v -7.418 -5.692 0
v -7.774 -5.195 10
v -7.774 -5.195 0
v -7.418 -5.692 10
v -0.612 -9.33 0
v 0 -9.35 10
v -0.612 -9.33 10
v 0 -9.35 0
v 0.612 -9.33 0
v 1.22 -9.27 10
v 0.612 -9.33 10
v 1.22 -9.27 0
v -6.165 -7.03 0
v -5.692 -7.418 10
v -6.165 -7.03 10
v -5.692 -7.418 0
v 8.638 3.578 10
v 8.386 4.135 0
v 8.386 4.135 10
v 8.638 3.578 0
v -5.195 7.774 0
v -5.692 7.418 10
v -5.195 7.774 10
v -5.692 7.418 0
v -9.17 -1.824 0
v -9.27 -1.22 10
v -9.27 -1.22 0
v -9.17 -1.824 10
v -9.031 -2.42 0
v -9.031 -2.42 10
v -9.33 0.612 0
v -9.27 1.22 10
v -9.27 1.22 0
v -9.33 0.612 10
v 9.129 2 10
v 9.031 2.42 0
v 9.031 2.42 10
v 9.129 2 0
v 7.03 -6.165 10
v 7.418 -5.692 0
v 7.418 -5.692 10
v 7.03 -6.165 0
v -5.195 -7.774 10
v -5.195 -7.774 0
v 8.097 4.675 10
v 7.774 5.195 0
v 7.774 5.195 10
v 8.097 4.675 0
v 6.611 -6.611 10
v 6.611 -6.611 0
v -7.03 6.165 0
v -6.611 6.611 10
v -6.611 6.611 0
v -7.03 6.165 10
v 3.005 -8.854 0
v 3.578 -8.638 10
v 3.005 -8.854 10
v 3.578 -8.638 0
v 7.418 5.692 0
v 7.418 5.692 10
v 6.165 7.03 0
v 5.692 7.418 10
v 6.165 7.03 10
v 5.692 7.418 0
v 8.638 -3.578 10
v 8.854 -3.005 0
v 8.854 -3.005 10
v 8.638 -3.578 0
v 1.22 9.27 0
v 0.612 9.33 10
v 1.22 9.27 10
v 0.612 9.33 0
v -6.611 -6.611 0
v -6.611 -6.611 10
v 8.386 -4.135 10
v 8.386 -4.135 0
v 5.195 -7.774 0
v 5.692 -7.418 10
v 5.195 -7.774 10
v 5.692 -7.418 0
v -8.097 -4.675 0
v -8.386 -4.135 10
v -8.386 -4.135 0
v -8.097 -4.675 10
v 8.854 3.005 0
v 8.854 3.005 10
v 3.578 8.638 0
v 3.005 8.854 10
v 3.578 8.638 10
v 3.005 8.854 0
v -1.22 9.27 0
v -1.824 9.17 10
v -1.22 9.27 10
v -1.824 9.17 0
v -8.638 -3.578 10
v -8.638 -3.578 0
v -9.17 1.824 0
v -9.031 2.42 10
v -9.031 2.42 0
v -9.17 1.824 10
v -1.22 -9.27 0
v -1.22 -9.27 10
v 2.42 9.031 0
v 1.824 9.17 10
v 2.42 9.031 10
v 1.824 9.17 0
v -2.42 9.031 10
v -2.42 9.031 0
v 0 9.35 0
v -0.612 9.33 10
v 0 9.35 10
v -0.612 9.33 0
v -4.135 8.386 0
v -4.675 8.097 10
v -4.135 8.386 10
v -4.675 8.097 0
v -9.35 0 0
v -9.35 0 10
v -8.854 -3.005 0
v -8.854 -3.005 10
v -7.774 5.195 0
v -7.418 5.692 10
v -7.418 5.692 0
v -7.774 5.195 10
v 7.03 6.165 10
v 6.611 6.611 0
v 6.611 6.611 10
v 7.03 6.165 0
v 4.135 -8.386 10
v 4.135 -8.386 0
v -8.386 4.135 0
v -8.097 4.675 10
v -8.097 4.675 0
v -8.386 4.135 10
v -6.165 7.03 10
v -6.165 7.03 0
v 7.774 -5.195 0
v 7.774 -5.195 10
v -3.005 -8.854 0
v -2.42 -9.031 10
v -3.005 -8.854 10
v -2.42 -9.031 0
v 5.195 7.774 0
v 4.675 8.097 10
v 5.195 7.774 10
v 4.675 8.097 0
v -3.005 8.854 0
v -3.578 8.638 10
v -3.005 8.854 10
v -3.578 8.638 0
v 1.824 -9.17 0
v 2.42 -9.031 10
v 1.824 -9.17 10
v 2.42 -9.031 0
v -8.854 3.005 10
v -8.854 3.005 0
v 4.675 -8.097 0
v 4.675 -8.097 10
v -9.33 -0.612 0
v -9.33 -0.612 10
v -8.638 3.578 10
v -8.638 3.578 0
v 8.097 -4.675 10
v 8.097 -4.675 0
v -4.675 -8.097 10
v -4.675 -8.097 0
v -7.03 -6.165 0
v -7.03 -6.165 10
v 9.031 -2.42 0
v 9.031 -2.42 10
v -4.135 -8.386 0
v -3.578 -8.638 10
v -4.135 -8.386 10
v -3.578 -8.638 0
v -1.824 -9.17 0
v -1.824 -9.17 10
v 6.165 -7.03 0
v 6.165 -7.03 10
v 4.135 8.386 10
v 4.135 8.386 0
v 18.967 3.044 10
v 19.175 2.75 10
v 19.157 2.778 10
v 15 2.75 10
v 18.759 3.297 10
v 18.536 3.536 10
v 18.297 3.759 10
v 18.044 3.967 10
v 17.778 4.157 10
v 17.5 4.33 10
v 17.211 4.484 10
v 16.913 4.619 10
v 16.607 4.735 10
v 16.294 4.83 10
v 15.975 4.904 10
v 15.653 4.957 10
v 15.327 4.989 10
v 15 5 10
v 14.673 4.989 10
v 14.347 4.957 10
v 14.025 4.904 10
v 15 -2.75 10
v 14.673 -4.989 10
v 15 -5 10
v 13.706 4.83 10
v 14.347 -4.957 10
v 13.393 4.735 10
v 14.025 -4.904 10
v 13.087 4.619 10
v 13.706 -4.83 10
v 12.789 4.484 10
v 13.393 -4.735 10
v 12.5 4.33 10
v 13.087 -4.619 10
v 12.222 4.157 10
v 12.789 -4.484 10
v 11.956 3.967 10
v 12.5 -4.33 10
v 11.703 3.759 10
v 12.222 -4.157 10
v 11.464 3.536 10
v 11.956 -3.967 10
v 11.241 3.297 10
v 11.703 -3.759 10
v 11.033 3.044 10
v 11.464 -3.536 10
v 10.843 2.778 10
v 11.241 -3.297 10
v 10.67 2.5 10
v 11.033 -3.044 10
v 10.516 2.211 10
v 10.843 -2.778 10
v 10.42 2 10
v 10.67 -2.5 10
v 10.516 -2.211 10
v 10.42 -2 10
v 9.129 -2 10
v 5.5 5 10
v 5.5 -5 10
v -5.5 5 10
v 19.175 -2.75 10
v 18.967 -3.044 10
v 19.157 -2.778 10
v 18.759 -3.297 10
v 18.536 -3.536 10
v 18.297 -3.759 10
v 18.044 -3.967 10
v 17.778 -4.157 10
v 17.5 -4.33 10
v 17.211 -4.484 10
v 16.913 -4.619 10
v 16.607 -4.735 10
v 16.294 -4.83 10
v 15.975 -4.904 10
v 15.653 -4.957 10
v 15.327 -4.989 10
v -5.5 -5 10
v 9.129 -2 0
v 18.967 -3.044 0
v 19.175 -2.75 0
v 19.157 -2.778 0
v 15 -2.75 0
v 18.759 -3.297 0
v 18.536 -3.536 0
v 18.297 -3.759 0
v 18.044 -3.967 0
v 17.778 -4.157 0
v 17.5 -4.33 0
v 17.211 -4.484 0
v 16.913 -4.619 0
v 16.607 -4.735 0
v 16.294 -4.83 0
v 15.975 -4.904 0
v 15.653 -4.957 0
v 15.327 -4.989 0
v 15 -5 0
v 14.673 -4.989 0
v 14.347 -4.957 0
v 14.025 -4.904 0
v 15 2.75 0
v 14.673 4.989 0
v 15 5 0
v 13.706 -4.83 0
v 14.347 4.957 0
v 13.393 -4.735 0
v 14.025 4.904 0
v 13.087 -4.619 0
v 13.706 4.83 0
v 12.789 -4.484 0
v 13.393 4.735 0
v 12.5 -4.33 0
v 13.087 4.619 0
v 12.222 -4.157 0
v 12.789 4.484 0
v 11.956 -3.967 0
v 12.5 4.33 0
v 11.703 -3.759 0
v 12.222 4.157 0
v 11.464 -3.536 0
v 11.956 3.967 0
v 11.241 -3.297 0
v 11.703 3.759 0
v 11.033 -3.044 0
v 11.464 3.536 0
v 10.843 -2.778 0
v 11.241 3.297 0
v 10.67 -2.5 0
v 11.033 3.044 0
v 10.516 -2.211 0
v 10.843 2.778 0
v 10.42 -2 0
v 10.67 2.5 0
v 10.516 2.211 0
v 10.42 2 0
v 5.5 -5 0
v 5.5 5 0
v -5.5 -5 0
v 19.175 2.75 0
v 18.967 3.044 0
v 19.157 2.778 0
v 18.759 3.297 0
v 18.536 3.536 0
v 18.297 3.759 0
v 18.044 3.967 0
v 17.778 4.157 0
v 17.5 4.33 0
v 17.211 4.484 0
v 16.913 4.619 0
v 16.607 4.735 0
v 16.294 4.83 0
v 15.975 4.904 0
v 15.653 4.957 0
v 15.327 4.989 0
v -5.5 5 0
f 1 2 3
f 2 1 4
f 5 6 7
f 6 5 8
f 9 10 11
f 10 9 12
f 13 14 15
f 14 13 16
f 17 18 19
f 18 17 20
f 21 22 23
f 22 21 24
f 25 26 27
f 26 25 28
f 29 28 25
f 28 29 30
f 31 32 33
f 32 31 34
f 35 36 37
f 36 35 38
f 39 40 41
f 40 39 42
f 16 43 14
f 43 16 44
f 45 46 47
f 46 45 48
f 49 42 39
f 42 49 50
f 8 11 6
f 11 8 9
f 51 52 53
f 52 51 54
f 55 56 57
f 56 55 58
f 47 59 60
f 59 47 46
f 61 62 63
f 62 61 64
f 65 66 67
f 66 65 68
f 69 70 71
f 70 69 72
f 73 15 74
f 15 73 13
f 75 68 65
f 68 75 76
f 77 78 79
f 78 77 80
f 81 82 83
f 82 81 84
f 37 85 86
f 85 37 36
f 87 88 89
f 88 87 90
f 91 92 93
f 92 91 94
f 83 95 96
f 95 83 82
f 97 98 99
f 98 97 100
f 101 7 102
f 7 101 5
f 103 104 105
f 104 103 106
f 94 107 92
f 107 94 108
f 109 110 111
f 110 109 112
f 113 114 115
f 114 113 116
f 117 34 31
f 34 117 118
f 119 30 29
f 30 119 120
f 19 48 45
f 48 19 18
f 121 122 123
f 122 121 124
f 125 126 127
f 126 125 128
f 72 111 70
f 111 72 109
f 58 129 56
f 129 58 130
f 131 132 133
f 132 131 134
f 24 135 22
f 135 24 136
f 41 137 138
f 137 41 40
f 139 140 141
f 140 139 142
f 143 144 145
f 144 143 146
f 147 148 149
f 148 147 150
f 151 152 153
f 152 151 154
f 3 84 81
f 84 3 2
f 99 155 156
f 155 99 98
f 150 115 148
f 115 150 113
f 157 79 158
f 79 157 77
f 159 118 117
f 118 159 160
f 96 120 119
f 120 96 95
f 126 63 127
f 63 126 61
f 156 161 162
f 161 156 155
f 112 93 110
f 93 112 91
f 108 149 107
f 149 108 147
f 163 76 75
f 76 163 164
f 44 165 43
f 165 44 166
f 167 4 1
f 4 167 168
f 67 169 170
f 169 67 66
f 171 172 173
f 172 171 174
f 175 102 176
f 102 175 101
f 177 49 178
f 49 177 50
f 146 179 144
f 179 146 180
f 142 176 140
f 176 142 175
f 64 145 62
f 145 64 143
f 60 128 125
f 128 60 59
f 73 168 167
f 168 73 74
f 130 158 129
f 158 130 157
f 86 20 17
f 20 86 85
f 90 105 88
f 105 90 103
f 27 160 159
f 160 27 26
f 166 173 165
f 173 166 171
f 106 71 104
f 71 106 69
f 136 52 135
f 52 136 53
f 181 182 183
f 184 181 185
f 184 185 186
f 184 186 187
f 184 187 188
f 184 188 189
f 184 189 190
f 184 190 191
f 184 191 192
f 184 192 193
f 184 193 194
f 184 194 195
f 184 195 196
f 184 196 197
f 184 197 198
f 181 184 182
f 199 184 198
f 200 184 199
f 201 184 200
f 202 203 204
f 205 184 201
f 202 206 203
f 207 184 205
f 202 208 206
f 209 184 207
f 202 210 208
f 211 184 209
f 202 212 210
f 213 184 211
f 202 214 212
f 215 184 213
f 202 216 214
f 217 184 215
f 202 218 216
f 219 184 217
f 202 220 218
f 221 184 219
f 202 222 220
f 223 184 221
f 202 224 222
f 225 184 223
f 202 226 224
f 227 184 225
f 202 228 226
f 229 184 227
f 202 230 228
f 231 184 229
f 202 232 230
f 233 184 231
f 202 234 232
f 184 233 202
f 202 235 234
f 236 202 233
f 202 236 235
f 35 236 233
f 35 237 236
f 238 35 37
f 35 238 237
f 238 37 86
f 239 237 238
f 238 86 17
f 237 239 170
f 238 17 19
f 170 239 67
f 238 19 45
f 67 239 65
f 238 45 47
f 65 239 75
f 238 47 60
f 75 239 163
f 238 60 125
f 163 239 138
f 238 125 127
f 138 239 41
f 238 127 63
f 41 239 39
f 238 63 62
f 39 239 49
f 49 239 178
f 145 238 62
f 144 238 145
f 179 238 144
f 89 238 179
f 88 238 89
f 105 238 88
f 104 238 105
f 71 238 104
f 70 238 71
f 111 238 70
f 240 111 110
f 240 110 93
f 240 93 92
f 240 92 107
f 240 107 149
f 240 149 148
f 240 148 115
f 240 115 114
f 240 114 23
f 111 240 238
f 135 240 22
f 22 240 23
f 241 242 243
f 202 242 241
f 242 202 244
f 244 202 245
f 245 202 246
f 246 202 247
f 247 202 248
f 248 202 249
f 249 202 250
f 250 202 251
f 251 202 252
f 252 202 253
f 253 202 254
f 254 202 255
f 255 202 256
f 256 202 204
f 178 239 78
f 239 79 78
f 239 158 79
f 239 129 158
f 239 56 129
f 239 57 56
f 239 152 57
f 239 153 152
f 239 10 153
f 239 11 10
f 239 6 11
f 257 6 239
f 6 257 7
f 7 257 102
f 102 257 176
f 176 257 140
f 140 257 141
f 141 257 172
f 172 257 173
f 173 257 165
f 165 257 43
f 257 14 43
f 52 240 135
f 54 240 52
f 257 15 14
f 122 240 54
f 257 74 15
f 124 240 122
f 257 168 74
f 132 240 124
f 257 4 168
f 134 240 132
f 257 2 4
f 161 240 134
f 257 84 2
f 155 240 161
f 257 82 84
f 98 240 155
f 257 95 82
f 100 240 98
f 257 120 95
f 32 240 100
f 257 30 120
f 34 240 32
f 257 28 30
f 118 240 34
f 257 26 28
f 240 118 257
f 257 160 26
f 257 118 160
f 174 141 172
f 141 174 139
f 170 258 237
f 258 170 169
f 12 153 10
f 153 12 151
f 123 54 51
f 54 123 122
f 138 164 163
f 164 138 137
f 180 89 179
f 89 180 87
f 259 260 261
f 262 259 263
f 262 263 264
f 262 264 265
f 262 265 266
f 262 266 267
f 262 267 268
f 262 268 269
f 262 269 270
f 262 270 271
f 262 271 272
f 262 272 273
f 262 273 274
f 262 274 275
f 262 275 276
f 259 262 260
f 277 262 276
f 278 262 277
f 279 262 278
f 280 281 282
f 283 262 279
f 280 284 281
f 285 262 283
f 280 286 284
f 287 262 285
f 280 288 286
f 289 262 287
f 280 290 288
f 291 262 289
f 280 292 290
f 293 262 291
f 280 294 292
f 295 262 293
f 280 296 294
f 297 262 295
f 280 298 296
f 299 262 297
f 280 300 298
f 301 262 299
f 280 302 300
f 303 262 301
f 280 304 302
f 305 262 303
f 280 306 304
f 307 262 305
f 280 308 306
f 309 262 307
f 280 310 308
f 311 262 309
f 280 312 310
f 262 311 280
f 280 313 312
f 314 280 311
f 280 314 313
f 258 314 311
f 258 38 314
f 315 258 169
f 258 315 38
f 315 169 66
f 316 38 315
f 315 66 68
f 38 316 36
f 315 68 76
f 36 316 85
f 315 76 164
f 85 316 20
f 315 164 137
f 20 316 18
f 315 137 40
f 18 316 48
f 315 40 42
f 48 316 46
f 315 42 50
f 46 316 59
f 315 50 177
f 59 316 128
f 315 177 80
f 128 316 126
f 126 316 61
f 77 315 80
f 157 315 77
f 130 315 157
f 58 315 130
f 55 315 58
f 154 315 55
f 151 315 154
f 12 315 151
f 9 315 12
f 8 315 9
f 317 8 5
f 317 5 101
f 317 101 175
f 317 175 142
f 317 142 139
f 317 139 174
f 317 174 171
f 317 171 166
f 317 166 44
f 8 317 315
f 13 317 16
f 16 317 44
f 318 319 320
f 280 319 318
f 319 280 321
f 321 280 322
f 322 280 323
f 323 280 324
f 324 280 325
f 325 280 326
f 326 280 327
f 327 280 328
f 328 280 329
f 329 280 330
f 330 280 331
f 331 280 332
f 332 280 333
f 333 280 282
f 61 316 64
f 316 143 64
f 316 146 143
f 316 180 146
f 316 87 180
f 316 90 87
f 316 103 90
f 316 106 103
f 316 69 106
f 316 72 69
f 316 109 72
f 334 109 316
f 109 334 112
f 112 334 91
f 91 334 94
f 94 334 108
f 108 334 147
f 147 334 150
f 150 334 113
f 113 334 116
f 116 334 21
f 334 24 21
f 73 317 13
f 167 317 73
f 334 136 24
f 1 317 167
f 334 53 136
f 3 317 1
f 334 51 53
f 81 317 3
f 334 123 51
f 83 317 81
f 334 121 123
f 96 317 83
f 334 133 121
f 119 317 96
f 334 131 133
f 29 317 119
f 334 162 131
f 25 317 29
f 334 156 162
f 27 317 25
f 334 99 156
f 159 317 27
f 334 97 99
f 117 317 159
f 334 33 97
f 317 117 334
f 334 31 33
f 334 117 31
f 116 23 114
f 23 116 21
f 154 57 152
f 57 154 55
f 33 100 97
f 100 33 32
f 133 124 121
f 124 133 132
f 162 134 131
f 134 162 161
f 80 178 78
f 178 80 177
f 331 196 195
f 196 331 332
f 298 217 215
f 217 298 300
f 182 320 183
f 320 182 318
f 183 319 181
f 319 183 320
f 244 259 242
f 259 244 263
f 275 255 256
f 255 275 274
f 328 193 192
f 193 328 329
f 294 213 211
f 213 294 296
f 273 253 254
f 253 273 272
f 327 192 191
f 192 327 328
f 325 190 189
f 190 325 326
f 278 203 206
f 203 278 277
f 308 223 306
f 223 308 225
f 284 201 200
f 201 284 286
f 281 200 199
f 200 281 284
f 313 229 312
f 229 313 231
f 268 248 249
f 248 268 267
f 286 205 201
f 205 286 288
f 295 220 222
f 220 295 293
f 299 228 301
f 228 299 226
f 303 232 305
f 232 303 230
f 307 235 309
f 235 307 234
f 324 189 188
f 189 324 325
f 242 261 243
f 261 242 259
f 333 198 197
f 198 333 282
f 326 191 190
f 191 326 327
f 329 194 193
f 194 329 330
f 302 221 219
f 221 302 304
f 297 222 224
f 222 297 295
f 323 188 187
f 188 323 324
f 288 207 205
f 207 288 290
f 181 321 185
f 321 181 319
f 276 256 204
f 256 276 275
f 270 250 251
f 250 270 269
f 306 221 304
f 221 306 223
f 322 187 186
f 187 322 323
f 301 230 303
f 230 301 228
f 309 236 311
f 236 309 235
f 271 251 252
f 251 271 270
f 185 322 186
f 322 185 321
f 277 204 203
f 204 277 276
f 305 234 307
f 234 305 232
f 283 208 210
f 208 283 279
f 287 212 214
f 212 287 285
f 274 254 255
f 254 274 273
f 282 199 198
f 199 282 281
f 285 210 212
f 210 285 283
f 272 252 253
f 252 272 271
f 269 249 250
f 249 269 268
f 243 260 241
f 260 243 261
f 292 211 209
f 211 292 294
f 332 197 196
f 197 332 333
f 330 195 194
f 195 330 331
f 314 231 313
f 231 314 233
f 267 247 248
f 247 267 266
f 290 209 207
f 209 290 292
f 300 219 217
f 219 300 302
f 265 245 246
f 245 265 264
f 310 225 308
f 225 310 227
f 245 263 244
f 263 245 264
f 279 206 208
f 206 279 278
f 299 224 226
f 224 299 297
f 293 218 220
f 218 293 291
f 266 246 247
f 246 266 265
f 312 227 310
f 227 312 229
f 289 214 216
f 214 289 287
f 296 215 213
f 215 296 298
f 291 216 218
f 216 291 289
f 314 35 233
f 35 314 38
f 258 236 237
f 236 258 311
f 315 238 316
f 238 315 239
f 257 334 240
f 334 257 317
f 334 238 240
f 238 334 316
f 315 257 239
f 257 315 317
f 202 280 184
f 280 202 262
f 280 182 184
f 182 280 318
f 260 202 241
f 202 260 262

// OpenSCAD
// Stand rod and tubing clip - prints flat as a 2-D profile in the XY plane
// Units: mm. $fn = 96 for the ring circles.

// ---------------- Parameters ----------------
ring_d        = 12.7;   // stand rod ring inner diameter
ring_wall     = 3;      // stand rod ring wall thickness
ring_outer    = ring_d + 2 * ring_wall; // 18.7 mm outer diameter
ring_open_w   = 10;     // width of the -X side opening (y = -5 to 5)

tub_d         = 6;      // tubing ring inner diameter
tub_wall      = 2;      // tubing ring wall thickness
tub_outer     = tub_d + 2 * tub_wall;   // 10 mm outer diameter
tub_open_w    = 4.5;    // width of the +X side opening (y = -2.25 to 2.25)

bridge_x0     = 8;      // bridge start (X)
bridge_x1     = 12;     // bridge end (X)
bridge_w      = bridge_x1 - bridge_x0;  // 6 mm wide (Y)

eps           = 0.5;    // cutter overshoot past faces
height        = 10;     // extrusion height (Z)

// ---------------- Model ----------------
difference() {
    union() {
        // Stand rod ring, centred at origin
        cylinder(d = ring_outer, h = height, $fn = 96);

        // Tubing ring, centred at x = 15, y = 0
        translate([15, 0, 0])
            cylinder(d = tub_outer, h = height, $fn = 96);

        // Solid bridge joining the two rings
        translate([bridge_x0, -bridge_w / 2, 0])
            cube([bridge_w, bridge_w, height]);
    }

    // Opening in stand rod ring: x < 0, -5 < y < 5
    translate([-ring_open_w / 2 - eps, -5, -eps])
        cube([ring_open_w + 2 * eps, 10, height + 2 * eps]);

    // Opening in tubing ring: x > 15, -2.25 < y < 2.25
    translate([15, -tub_open_w / 2 - eps, -eps])
        cube([tub_open_w + 2 * eps, tub_open_w + 2 * eps, height + 2 * eps]);
}
